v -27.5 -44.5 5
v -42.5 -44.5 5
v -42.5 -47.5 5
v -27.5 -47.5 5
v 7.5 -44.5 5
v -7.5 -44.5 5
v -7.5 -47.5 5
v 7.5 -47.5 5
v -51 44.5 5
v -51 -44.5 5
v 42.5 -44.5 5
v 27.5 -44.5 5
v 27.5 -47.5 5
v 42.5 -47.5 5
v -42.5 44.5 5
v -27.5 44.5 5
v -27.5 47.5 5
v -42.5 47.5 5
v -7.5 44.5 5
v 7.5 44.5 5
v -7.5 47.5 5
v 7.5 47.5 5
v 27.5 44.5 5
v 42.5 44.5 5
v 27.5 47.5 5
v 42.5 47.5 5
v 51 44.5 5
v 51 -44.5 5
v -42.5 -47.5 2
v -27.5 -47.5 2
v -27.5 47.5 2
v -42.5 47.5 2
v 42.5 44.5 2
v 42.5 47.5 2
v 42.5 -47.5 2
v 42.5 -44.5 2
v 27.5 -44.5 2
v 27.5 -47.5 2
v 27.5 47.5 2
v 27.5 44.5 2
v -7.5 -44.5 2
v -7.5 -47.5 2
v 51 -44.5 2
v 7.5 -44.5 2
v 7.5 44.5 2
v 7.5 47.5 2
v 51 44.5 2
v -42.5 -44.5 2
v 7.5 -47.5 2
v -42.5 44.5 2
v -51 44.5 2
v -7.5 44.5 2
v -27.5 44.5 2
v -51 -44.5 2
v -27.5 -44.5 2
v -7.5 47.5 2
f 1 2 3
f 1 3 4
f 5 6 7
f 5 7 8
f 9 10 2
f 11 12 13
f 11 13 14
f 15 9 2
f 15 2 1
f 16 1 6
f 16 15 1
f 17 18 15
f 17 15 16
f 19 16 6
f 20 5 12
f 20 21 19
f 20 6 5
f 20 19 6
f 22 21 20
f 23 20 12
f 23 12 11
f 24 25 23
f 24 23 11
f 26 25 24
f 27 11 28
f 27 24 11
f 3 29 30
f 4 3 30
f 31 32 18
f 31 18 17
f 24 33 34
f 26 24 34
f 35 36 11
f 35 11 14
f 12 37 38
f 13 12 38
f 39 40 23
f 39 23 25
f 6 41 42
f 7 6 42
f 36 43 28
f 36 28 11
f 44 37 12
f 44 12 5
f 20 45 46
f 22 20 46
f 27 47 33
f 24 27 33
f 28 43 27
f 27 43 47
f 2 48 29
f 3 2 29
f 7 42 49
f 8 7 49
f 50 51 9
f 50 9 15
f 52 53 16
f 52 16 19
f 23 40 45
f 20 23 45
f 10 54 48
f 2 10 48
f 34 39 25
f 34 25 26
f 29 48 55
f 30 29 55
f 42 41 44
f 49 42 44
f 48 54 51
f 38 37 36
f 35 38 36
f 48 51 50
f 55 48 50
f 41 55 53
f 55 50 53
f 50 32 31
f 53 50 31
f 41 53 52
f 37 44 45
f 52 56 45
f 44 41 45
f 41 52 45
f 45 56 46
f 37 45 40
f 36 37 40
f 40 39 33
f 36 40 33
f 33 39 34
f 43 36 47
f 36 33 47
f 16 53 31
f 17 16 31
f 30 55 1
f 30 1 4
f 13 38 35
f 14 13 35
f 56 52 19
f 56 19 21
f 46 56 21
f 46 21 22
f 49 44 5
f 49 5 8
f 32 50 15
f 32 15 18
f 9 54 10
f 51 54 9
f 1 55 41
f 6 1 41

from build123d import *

# Parameters (mm, degrees)
SKETCH008_W                   = 102
SKETCH008_H                   = 95
PAD004_DEPTH                  = 3
SKETCH019_W                   = 8.5
SKETCH019_H                   = 3
SKETCH019_W_2                 = 20
POCKET014_DEPTH               = 281.841456
SKETCH019_MIRRORED017_2_W     = 8.5
SKETCH019_MIRRORED017_2_H     = 3
SKETCH019_MIRRORED017_2_W_2   = 20
POCKET014_MIRRORED017_2_DEPTH = 281.841456


with BuildPart() as part:
    # Sketch008 → Pad004 (new body)
    with BuildSketch(Plane.XY):
        Rectangle(SKETCH008_W, SKETCH008_H)
    extrude(amount=PAD004_DEPTH)

    # Sketch019 → Pocket014 (cut, through all)
    with BuildSketch(Plane.XY):
        with Locations((-46.75, 46)):
            Rectangle(SKETCH019_W, SKETCH019_H)
        with Locations((-17.5, 46)):
            Rectangle(SKETCH019_W_2, SKETCH019_H)
    pocket014 = extrude(amount=POCKET014_DEPTH, mode=Mode.SUBTRACT)

    # Sketch019 Mirrored017 2 → Pocket014 Mirrored017 2 (cut, through all)
    with BuildSketch(Plane(origin=(0, 0, 0), x_dir=(-1, 0, 0), z_dir=(0, 0, -1))):
        with Locations((-46.75, 46)):
            Rectangle(SKETCH019_MIRRORED017_2_W, SKETCH019_MIRRORED017_2_H)
        with Locations((-17.5, 46)):
            Rectangle(SKETCH019_MIRRORED017_2_W_2, SKETCH019_MIRRORED017_2_H)
    pocket014_mirrored017_2 = extrude(amount=-POCKET014_MIRRORED017_2_DEPTH, mode=Mode.SUBTRACT)

    # Mirrored018: Pocket014, Pocket014 Mirrored017 2 across Sketch019 H_Axis
    add(pocket014.mirror(Plane.ZX), mode=Mode.SUBTRACT)
    add(pocket014_mirrored017_2.mirror(Plane.ZX), mode=Mode.SUBTRACT)


with BuildPart() as part_1:
    # Body002 placement: moved
    add(part.part.moved(Location((0, 0, 2))))


solid = part_1.part
